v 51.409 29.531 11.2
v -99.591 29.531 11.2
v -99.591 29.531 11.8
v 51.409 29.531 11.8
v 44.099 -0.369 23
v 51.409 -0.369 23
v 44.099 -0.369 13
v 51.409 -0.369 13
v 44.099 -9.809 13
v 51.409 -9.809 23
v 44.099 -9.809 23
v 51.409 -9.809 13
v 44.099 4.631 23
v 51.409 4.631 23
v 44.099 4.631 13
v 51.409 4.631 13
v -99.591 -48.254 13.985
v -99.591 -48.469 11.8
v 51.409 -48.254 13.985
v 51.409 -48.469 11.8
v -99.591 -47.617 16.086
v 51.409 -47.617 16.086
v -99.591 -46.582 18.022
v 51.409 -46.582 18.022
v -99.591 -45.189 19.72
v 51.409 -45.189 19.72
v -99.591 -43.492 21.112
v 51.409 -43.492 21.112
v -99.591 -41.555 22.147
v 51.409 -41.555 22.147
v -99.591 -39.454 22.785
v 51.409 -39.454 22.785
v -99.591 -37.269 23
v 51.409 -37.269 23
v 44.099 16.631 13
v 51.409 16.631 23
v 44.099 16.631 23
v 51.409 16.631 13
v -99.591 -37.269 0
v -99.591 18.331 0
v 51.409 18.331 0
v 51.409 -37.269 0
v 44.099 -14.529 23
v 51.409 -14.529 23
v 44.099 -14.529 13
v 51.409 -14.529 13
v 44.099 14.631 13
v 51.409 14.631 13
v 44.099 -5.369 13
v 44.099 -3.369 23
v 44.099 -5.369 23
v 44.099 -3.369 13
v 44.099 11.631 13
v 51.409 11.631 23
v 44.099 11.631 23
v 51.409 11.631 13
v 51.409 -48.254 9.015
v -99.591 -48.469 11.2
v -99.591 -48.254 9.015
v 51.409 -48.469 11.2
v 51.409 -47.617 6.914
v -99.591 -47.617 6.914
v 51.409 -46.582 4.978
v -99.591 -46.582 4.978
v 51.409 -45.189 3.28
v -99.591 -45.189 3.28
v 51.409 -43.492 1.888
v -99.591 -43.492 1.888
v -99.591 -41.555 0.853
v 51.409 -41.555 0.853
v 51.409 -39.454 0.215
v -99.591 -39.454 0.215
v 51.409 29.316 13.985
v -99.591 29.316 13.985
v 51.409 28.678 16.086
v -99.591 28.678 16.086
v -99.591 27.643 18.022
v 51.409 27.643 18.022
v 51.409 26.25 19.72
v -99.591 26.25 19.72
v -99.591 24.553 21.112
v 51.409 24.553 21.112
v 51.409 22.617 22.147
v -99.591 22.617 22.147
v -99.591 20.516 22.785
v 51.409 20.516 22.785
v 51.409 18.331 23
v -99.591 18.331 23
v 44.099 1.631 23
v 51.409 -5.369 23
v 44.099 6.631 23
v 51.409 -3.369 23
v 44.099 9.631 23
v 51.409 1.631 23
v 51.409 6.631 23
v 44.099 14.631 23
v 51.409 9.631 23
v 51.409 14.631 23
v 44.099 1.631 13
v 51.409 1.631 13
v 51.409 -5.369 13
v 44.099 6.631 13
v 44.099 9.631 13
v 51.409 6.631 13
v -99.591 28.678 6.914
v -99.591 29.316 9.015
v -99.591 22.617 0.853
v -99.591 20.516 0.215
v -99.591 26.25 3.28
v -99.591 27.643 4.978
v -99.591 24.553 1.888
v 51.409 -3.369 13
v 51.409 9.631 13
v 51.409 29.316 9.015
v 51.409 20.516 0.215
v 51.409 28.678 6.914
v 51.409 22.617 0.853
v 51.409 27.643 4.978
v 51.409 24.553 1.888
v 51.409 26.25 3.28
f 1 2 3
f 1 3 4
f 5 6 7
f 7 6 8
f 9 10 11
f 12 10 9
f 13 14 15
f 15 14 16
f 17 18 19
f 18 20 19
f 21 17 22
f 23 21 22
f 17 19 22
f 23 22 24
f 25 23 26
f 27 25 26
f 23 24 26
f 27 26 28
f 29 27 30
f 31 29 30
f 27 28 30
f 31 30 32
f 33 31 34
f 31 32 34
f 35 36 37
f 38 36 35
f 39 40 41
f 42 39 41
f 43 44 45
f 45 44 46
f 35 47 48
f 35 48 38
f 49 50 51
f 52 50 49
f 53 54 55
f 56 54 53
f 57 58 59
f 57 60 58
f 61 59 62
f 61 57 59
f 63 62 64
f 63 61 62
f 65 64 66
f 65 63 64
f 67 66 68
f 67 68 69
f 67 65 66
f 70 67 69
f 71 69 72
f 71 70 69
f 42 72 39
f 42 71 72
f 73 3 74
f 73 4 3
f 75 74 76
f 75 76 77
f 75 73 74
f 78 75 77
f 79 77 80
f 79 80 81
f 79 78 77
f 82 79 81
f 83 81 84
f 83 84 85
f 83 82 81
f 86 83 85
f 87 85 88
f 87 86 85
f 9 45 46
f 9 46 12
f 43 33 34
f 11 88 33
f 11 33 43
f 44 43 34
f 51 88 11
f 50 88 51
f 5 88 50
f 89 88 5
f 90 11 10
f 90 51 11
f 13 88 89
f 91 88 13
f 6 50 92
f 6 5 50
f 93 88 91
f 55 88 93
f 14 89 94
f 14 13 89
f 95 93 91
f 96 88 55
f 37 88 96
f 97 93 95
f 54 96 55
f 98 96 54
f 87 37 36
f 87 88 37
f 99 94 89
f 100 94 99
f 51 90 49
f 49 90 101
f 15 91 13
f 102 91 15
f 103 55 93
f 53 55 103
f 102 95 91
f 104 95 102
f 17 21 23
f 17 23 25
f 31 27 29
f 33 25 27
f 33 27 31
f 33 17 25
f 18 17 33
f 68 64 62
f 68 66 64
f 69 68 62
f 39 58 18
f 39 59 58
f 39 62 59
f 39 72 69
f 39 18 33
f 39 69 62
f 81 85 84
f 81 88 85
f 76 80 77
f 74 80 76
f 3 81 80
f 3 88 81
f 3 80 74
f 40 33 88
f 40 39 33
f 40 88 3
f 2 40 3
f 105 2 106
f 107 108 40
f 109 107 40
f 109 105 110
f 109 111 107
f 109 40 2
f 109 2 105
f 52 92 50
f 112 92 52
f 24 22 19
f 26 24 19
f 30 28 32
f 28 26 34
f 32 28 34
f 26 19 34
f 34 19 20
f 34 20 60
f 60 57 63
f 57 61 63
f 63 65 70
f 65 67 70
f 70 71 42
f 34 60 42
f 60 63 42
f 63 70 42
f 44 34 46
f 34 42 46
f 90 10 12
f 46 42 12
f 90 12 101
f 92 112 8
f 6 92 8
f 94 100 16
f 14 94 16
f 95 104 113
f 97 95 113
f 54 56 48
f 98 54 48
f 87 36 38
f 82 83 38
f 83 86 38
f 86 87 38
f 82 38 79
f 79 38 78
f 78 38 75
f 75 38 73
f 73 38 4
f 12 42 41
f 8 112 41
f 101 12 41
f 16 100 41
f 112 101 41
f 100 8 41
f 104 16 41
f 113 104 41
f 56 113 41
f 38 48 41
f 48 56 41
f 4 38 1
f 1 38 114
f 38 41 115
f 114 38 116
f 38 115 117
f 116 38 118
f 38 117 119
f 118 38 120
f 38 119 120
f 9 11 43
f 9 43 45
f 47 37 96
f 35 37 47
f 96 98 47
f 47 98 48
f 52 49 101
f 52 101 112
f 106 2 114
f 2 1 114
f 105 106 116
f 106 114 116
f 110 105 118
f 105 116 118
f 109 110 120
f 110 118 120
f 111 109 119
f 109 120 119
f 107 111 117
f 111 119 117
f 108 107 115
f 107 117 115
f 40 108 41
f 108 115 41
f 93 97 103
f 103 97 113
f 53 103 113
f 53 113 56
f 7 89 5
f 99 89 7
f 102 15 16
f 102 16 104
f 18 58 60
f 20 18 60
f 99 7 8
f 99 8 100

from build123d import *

# Parameters (mm, degrees)
ESQUISSE2_W             = 151
ESQUISSE2_H             = 78
BOSS_EXTRU_1_DEPTH      = 23
ESQUISSE3_W             = 10
ESQUISSE3_H             = 2
ESQUISSE3_H_2           = 4.72
ENL_V_MAT_EXTRU_1_DEPTH = 7.31
CONG_1_R                = 11.2


with BuildPart() as part:
    # Esquisse2 → Boss.-Extru.1 (new body)
    with BuildSketch(Plane.XY):
        with Locations((-24.090850635, -9.469261584)):
            Rectangle(ESQUISSE2_W, ESQUISSE2_H)
    extrude(amount=BOSS_EXTRU_1_DEPTH)

    # Esquisse3 → Enlèv. mat.-Extru.1 (cut)
    with BuildSketch(Plane(origin=(51.409149365, 0, 0), x_dir=(0, 0, -1), z_dir=(1, 0, 0))):
        with Locations((-18, 5.630738416)):
            Rectangle(ESQUISSE3_W, ESQUISSE3_H)
        with Locations((-18, 10.630738416)):
            Rectangle(ESQUISSE3_W, ESQUISSE3_H)
        with Locations((-18, -12.169261584)):
            Rectangle(ESQUISSE3_W, ESQUISSE3_H_2)
        with Locations((-18, 15.630738416)):
            Rectangle(ESQUISSE3_W, ESQUISSE3_H)
        with Locations((-18, 0.630738416)):
            Rectangle(ESQUISSE3_W, ESQUISSE3_H)
        with Locations((-18, -4.369261584)):
            Rectangle(ESQUISSE3_W, ESQUISSE3_H)
    extrude(amount=-ENL_V_MAT_EXTRU_1_DEPTH, mode=Mode.SUBTRACT)

    # Congé1
    cong_1_edges = [part.edges().sort_by_distance(p)[0] for p in [
        (-24.090850635, 29.530738416, 23),
        (-24.090850635, 29.530738416, 0),
        (-24.090850635, -48.469261584, 0),
        (-24.090850635, -48.469261584, 23),
    ]]
    fillet(cong_1_edges, radius=CONG_1_R)


solid = part.part
